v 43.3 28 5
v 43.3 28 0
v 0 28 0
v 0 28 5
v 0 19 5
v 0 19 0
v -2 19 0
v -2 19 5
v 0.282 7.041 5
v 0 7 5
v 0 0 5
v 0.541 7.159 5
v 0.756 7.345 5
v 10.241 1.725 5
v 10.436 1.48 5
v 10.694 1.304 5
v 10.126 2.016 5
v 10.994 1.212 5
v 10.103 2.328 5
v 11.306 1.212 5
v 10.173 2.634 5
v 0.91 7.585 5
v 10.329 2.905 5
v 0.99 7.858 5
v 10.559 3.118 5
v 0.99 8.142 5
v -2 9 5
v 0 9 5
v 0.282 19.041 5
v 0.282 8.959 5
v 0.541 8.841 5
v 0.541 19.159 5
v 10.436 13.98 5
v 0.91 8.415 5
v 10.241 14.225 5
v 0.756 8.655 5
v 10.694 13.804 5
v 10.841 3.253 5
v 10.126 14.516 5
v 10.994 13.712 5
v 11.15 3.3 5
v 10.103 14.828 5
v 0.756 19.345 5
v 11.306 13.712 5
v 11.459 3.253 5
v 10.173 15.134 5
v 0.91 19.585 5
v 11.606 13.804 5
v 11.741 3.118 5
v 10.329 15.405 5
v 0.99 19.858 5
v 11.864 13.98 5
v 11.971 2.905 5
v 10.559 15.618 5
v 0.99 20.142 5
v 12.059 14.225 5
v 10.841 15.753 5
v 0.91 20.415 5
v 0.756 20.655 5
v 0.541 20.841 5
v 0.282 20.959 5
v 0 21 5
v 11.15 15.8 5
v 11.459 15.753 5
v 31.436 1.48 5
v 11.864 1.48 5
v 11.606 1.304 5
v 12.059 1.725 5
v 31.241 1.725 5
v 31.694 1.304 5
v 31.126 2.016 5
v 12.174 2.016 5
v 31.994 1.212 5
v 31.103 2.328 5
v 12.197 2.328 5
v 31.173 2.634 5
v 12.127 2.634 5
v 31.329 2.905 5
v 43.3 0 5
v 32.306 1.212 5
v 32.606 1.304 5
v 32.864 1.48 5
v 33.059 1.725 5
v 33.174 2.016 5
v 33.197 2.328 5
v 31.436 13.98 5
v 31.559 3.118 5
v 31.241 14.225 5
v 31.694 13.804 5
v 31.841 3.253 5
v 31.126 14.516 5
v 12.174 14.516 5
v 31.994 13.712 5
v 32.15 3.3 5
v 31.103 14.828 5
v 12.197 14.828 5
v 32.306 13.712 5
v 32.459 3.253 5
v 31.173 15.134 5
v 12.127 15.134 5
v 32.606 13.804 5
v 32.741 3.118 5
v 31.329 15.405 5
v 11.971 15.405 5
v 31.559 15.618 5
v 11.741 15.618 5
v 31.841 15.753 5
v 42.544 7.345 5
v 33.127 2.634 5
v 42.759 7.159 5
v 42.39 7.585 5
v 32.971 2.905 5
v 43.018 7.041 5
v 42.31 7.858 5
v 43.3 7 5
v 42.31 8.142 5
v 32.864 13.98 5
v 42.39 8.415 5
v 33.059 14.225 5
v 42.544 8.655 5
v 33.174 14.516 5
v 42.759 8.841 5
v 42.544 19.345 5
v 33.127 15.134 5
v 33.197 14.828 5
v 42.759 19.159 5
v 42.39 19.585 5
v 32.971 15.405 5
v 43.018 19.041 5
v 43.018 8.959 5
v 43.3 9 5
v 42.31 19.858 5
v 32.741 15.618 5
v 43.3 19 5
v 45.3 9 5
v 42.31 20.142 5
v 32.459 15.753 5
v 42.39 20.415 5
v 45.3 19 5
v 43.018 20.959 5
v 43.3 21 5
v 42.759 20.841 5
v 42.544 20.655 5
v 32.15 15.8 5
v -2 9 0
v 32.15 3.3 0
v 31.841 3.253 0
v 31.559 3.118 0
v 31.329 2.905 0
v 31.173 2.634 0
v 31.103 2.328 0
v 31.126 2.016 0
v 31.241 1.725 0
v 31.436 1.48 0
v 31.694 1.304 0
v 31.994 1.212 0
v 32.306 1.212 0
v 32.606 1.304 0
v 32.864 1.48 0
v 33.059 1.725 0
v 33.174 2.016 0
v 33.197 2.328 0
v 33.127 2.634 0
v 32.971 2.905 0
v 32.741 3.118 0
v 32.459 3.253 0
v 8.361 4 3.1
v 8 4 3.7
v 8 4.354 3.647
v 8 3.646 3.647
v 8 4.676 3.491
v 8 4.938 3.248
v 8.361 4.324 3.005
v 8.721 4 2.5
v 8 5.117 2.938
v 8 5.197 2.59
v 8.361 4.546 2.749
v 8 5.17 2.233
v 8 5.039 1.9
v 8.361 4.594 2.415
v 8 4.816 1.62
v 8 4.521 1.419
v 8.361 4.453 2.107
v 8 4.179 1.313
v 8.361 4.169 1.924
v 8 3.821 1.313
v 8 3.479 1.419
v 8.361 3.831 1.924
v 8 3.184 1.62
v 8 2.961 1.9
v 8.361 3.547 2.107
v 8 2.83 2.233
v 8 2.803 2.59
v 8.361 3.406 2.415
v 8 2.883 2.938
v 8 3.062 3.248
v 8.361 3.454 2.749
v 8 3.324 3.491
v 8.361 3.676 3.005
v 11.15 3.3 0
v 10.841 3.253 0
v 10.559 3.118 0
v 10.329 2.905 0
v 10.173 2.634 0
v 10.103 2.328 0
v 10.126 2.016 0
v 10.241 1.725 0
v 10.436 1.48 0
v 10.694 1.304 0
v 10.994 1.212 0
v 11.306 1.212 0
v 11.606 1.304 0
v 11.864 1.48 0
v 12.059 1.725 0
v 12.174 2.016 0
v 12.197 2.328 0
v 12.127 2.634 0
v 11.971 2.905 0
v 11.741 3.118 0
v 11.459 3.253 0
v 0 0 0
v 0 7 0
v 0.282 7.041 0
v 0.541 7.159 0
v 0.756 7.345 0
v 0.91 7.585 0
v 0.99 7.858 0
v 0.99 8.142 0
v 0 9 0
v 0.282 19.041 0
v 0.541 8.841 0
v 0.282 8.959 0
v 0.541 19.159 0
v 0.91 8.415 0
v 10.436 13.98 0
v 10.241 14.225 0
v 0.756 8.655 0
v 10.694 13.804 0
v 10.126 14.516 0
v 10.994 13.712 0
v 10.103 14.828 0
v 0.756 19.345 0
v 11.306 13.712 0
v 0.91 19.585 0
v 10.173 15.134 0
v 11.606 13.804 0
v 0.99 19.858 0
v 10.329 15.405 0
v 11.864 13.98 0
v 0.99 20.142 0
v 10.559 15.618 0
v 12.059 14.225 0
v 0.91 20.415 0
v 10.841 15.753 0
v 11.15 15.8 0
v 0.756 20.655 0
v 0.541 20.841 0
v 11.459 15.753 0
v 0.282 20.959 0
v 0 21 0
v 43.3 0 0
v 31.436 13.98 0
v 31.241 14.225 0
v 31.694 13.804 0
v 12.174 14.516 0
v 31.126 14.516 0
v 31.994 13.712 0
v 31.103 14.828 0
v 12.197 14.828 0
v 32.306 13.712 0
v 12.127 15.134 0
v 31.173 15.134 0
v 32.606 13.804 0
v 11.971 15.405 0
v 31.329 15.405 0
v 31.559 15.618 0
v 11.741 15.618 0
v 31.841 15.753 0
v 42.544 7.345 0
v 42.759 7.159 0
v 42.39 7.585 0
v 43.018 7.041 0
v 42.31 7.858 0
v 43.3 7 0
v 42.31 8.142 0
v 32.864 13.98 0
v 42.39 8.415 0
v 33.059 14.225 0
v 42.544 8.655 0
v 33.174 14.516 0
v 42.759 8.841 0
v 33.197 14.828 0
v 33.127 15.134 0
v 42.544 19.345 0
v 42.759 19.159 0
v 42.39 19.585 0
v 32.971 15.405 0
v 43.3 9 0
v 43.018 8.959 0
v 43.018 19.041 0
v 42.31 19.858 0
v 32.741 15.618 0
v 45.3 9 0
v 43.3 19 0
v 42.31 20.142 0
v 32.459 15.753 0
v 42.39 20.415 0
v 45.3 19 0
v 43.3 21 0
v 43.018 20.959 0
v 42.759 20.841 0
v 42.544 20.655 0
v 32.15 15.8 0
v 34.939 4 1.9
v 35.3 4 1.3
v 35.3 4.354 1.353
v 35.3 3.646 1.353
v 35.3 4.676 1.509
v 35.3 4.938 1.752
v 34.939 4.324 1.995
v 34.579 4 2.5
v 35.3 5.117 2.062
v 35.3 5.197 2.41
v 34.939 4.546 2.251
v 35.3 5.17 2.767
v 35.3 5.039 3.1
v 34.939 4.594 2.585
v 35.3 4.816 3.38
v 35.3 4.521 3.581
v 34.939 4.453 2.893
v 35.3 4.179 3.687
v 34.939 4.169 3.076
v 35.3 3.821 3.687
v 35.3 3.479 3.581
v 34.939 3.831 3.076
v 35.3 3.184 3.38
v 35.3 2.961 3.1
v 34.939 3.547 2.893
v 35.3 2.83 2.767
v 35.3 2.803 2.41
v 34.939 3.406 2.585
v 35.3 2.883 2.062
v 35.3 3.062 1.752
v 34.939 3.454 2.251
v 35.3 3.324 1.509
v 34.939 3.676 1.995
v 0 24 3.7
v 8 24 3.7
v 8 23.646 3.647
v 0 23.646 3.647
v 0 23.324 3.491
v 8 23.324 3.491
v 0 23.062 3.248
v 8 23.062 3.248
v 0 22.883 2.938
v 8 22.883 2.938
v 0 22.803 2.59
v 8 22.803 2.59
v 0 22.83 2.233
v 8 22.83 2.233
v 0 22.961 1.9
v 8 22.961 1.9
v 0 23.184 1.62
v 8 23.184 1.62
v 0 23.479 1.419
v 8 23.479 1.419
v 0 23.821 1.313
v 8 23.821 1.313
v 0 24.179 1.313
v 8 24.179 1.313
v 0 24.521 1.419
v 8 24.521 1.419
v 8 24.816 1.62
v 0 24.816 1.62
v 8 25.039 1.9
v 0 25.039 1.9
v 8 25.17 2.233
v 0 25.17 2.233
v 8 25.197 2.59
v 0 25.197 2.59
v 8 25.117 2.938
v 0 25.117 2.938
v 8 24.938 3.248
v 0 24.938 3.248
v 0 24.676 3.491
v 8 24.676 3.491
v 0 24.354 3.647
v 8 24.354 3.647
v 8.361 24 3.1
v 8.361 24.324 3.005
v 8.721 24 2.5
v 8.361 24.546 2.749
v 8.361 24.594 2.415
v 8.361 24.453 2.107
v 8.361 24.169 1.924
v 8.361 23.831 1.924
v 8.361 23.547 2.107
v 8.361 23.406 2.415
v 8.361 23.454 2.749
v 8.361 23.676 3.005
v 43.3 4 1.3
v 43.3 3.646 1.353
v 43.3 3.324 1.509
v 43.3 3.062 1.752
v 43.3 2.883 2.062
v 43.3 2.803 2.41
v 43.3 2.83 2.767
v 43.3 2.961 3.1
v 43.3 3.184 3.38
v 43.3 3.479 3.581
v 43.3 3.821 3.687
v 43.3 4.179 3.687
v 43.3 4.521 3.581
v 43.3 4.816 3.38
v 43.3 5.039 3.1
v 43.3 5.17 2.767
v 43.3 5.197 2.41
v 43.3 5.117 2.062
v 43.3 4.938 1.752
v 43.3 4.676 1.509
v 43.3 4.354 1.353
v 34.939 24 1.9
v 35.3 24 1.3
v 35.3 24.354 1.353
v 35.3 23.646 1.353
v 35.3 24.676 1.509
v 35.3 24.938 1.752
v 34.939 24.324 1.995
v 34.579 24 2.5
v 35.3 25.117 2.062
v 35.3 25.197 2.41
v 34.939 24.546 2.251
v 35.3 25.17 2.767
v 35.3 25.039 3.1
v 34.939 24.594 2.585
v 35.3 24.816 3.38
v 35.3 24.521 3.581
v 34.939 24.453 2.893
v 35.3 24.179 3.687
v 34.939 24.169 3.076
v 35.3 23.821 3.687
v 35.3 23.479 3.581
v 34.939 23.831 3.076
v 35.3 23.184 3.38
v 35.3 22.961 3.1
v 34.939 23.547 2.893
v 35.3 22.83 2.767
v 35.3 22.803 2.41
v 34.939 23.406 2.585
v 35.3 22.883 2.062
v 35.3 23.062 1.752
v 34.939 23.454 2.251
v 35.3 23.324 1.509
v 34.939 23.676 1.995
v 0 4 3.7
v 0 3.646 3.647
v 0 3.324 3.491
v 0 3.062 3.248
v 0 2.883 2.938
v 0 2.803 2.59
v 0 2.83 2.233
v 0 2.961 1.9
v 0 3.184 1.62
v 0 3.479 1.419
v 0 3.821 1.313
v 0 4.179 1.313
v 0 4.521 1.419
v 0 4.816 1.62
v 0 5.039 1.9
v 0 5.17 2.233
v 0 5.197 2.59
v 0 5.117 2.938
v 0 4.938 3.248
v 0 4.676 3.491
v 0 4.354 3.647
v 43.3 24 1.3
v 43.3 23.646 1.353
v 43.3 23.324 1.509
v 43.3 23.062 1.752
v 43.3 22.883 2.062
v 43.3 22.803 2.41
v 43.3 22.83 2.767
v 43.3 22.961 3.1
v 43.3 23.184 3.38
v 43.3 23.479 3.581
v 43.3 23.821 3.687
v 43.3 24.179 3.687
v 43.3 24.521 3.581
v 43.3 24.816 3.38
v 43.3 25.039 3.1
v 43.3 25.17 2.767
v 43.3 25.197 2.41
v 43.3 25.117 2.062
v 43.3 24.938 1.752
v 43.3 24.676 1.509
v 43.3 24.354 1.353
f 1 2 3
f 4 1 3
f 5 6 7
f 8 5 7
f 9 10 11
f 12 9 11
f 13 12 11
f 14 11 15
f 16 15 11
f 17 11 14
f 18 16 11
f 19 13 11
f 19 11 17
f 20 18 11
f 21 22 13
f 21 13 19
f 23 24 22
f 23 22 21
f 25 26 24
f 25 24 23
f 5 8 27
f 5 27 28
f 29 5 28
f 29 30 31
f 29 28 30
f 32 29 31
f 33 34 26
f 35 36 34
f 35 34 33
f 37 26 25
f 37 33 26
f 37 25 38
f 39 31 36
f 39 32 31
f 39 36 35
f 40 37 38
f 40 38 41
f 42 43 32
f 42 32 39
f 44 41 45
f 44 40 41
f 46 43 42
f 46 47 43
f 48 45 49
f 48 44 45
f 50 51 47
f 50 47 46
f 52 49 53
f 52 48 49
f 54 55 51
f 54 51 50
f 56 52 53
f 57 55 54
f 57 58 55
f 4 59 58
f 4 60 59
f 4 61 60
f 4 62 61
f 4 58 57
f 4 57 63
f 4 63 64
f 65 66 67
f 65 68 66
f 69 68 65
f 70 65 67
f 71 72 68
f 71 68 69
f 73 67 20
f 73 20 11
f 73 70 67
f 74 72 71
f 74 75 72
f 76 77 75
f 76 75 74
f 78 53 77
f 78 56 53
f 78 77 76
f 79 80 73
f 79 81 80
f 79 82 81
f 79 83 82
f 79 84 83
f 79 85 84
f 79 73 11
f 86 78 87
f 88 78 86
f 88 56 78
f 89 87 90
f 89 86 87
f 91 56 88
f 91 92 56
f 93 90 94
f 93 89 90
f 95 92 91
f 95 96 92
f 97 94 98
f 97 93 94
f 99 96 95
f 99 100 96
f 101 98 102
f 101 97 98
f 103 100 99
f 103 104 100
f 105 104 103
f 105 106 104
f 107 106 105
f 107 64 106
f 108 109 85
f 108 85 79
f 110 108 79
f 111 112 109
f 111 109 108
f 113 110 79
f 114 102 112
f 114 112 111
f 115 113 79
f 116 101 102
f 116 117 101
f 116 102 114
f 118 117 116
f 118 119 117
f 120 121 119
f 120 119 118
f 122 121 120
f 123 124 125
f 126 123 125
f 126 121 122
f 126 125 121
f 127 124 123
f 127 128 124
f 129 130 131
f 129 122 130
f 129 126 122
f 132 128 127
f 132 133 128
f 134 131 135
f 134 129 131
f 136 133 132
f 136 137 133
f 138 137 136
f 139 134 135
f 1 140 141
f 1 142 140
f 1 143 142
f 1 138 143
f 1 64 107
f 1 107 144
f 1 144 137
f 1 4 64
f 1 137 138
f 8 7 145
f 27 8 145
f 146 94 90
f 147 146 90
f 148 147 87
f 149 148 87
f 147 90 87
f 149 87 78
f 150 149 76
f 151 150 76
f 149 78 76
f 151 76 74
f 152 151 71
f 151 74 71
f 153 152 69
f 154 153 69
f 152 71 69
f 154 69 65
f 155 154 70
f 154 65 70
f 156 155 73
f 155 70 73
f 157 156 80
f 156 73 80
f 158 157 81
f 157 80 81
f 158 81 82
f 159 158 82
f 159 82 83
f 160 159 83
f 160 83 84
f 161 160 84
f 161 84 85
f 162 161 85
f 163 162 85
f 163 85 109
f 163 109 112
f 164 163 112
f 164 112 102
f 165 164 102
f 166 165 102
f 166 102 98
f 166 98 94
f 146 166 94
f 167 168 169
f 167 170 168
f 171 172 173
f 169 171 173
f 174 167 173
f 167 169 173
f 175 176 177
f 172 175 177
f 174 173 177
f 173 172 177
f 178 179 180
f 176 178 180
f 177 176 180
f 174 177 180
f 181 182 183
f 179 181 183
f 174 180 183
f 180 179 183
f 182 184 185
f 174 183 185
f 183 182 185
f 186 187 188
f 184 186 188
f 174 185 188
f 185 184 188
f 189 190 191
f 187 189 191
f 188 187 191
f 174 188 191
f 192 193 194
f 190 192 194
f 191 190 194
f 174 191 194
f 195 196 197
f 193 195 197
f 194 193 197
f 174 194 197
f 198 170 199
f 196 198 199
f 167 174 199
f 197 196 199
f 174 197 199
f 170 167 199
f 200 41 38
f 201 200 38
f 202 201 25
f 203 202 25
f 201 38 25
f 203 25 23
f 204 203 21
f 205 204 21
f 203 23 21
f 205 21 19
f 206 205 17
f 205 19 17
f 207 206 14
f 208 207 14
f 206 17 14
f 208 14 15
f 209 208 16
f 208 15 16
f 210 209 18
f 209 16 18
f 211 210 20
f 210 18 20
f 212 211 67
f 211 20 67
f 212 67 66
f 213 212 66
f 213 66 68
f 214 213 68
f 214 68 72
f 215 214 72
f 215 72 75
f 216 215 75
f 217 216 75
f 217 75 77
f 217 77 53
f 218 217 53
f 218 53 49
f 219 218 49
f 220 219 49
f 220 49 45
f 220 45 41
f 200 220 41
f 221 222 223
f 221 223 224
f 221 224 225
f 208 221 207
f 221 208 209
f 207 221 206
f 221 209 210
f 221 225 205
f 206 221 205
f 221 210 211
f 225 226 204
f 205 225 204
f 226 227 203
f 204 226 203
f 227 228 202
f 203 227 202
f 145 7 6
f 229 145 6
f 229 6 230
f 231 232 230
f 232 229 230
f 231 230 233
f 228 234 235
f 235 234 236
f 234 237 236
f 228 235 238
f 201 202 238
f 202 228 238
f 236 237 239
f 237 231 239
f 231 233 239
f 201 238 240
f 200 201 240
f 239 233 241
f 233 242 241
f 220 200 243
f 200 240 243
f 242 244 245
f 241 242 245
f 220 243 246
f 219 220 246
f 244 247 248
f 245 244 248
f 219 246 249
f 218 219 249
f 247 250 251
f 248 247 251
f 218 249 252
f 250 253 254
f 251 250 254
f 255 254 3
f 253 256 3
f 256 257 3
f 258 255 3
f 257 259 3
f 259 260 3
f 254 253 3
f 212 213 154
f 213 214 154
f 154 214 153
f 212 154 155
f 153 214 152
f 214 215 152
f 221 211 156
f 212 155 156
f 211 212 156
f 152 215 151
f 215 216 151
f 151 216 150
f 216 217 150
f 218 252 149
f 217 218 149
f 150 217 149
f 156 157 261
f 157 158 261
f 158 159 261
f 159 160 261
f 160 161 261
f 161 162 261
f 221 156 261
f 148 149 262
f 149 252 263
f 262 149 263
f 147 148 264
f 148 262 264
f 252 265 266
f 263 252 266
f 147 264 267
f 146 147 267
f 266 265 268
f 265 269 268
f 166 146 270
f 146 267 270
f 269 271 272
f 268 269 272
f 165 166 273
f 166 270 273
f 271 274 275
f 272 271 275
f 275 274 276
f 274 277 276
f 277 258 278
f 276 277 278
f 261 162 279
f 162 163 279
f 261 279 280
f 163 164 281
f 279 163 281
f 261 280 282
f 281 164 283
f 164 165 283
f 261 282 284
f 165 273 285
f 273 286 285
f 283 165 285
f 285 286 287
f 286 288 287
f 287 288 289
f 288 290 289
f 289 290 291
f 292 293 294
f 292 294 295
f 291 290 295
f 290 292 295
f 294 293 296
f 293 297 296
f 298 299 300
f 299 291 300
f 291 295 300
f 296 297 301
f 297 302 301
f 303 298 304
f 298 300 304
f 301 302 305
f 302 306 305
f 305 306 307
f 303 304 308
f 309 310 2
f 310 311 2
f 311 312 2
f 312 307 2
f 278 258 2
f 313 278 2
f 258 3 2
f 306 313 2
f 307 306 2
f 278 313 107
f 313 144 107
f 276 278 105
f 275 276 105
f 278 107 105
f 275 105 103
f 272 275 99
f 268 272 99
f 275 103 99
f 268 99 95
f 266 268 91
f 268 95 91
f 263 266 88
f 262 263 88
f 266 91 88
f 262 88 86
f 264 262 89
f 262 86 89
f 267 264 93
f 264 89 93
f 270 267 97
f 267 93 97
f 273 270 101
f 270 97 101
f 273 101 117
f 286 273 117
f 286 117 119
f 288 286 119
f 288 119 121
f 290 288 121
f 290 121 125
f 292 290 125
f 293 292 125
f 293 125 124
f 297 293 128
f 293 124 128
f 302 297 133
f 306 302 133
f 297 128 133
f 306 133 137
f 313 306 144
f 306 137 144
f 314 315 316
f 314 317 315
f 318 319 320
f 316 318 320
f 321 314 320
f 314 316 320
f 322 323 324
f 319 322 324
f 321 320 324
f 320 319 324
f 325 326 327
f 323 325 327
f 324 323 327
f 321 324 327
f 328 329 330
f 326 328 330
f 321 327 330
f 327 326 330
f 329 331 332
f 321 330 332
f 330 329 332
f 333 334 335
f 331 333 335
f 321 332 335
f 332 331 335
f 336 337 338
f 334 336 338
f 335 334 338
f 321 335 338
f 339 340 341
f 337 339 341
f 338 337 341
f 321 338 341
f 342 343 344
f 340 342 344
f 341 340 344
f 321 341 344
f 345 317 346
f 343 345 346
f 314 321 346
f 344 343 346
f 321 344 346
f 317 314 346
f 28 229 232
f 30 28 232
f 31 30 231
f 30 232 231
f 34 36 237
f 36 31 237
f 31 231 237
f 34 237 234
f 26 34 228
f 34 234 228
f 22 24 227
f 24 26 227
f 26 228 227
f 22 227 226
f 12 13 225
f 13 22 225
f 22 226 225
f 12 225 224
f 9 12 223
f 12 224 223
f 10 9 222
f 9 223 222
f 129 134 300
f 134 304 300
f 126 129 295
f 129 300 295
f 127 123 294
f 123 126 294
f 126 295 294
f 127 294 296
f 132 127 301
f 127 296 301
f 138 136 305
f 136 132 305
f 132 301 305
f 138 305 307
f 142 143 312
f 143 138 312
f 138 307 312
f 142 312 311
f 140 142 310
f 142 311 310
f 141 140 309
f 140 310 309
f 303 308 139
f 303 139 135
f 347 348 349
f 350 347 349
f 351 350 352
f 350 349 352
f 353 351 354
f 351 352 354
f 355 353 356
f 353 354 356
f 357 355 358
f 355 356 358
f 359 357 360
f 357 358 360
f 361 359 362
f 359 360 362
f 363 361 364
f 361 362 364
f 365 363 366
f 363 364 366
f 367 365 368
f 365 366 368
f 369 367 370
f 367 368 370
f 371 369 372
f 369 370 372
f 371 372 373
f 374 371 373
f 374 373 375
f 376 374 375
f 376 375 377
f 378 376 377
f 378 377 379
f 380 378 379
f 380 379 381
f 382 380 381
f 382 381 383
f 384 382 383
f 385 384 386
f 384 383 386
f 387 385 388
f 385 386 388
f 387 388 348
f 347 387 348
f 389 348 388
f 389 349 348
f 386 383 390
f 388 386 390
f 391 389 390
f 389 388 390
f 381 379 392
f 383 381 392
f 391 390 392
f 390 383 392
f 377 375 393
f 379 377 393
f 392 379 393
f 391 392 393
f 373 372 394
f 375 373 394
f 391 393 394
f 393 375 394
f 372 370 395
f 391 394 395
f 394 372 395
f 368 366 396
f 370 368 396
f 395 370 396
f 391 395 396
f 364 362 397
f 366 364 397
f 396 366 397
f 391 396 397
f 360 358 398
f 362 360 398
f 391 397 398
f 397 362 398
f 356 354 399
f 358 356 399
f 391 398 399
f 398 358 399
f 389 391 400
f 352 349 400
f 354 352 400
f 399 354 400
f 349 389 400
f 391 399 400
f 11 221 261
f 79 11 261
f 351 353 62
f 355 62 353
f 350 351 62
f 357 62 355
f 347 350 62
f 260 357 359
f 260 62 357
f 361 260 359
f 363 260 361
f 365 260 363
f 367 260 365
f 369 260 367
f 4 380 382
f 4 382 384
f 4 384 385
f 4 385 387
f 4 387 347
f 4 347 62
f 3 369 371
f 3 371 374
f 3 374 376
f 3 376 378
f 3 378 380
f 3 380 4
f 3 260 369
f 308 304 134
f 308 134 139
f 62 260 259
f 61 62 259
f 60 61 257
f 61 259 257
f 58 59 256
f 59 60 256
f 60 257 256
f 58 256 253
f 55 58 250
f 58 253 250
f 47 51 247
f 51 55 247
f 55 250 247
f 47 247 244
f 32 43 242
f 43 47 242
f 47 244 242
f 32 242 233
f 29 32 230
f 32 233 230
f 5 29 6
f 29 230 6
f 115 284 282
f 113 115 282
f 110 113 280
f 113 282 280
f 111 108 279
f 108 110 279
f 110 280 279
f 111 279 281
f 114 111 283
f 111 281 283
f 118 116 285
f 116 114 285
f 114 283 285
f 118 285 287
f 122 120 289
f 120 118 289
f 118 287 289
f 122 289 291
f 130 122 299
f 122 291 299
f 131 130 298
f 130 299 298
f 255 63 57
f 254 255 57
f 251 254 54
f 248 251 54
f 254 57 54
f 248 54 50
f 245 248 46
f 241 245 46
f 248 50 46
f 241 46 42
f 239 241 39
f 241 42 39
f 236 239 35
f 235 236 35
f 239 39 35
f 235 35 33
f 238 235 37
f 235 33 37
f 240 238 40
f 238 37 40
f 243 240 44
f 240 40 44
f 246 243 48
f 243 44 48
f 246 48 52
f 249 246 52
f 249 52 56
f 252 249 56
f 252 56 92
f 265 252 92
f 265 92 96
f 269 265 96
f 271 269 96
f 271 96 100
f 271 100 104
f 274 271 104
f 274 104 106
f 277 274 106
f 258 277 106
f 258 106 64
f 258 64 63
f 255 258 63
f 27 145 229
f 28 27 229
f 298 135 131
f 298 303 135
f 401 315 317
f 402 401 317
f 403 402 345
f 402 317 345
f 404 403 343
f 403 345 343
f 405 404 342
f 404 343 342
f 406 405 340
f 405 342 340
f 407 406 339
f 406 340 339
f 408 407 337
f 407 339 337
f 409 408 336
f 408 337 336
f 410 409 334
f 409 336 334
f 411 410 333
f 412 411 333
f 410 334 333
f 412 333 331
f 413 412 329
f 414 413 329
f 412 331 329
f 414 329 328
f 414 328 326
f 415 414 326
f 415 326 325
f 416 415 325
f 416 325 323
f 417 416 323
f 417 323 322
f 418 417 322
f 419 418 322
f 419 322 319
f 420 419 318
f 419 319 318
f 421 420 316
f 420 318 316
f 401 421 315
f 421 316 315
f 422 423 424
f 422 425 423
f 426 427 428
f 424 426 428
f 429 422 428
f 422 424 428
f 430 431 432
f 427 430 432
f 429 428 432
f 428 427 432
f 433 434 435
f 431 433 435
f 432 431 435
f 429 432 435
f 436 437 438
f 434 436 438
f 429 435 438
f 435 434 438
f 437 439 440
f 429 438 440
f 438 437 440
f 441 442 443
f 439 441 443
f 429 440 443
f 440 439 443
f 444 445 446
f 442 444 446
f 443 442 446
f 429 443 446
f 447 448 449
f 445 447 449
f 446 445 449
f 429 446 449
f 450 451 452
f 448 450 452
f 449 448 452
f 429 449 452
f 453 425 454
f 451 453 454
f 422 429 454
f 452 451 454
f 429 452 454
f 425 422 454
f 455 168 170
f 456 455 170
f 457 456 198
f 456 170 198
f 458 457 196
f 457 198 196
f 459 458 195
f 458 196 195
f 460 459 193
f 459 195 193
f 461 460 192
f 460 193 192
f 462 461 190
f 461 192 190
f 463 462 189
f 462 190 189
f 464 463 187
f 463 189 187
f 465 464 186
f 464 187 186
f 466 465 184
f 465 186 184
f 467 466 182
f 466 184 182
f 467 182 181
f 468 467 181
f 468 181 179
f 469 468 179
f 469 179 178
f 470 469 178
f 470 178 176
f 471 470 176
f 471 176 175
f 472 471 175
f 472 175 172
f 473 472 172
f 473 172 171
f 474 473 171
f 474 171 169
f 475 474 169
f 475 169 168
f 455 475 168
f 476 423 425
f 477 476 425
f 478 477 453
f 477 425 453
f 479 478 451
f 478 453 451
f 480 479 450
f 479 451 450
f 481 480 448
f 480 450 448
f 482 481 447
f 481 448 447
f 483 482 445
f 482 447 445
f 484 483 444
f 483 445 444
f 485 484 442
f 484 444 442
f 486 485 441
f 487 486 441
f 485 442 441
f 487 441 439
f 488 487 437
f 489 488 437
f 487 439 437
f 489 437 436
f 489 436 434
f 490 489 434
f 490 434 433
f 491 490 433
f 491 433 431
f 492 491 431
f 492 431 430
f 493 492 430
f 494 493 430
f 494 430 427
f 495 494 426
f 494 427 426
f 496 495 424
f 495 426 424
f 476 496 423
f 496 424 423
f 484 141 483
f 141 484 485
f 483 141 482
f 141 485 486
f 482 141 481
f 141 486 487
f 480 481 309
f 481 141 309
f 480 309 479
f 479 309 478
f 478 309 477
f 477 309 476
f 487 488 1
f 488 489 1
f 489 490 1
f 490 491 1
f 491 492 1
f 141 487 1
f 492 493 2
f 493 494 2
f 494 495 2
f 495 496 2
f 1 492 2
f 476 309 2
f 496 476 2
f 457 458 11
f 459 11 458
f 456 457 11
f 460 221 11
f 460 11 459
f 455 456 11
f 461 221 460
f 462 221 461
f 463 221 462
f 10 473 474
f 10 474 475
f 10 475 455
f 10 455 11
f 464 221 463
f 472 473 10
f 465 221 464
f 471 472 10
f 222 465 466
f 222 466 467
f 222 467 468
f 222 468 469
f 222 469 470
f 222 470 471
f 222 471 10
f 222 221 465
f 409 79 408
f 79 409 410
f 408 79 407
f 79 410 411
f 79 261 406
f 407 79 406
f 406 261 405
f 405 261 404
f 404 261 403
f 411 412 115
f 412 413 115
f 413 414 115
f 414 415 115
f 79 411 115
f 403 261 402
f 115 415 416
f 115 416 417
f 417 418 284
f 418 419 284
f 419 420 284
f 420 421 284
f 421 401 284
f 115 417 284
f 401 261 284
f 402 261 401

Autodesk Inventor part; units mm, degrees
ref_plane "YZ Plane" through (0, 0, 0) normal (1, 0, 0) x (0, 1, 0)
ref_plane "XZ Plane" through (0, 0, 0) normal (0, 1, 0) x (-1, 0, 0)
ref_plane "XY Plane" through (0, 0, 0) normal (0, 0, 1) x (1, 0, 0)
sketch "スケッチ1" plane through (0, 0, 0) normal (0, 0, 1) x (1, 0, 0)
  line L0 (0, 0) -> (43.3, 0)
  line L1 (43.3, 28) -> (0, 28)
  line L2 (0, 14) -> (43.3, 14) construction
  line L3 (43.3, 19) -> (45.3, 19)
  line L4 (45.3, 19) -> (45.3, 9)
  line L5 (45.3, 9) -> (43.3, 9)
  arc A0 (43.3, 21) -> (43.3, 19) centre (43.3, 20) ccw
  arc A1 (43.3, 9) -> (43.3, 7) centre (43.3, 8) ccw
  line L6 (43.3, 0) -> (43.3, 7)
  line L7 (43.3, 21) -> (43.3, 28)
  line L8 (21.65, 28) -> (21.65, 0) construction
  line L9 (0, 19) -> (-2, 19)
  line L10 (-2, 19) -> (-2, 9)
  line L11 (-2, 9) -> (0, 9)
  arc A2 (0, 19) -> (0, 21) centre (0, 20) ccw
  arc A3 (0, 7) -> (0, 9) centre (0, 8) ccw
  line L12 (0, 0) -> (0, 7)
  line L13 (0, 21) -> (0, 28)
  dimension "d0" = 43.3
  dimension "d1" = 28
  dimension "d5" = 10
  dimension "d6" = 2
extrude "押し出し1" add sketch "スケッチ1" along normal blind 5
sketch "スケッチ3" plane through (43.3, 0, 0) normal (1, 0, 0) x (0, 0, -1)
  line L0 (0, 0) -> (-5, 0) projected
  line L1 (-2.5, 0) -> (-2.5, 28) construction
  line L2 (0, 28) -> (-5, 28) projected
  line L3 (-2.5, 14) -> (0, 14) construction
  line L4 (0, 9) -> (0, 19) projected
  point P0 (-2.5, 24)
  point P1 (-2.5, 4)
  dimension "d7" = 20
hole "穴1" at (43.3, 24, 2.5) at (43.3, 4, 2.5) direction (-1, 0, 0) diameter 2.4 depth 8 tip angle 118
sketch "スケッチ4" plane through (0, 21, 0) normal (-1, 0, 0) x (0, 0, 1)
  circle A0 centre (2.5, 3) radius 1.2 projected
  circle A1 centre (2.5, -17) radius 1.2 projected
  circle A2 centre (2.5, -17) radius 1.2 projected
  point P0 (0, -21)
hole "穴2" at (0, 24, 2.5) at (0, 4, 2.5) direction (1, 0, 0) diameter 2.4 depth 8 tip angle 118
sketch "スケッチ5" plane through (0, 0, 0) normal (0, 0, -1) x (-1, 0, 0)
  line L0 (0, 0) -> (-43.3, 0) projected
  line L1 (-21.65, 0) -> (-21.65, 28) construction
  line L2 (-43.3, 28) -> (0, 28) projected
  line L3 (-21.65, 8.5) -> (-45.9978, 8.5) construction
  point P0 (-32.15, 2.25)
  point P1 (-11.15, 2.25)
  point P2 (-32.15, 14.75)
  point P3 (-11.15, 14.75)
  dimension "d22" = 21
  dimension "d23" = 12.5
  dimension "d24" = 8.5
hole "穴3" at (32.15, 2.25, 0) at (11.15, 2.25, 0) at (11.15, 14.75, 0) at (32.15, 14.75, 0) direction (0, 0, 1) diameter 2.1 end through all
properties part number "頭_メインフレームセンター" material "アセタール樹脂、黒"
